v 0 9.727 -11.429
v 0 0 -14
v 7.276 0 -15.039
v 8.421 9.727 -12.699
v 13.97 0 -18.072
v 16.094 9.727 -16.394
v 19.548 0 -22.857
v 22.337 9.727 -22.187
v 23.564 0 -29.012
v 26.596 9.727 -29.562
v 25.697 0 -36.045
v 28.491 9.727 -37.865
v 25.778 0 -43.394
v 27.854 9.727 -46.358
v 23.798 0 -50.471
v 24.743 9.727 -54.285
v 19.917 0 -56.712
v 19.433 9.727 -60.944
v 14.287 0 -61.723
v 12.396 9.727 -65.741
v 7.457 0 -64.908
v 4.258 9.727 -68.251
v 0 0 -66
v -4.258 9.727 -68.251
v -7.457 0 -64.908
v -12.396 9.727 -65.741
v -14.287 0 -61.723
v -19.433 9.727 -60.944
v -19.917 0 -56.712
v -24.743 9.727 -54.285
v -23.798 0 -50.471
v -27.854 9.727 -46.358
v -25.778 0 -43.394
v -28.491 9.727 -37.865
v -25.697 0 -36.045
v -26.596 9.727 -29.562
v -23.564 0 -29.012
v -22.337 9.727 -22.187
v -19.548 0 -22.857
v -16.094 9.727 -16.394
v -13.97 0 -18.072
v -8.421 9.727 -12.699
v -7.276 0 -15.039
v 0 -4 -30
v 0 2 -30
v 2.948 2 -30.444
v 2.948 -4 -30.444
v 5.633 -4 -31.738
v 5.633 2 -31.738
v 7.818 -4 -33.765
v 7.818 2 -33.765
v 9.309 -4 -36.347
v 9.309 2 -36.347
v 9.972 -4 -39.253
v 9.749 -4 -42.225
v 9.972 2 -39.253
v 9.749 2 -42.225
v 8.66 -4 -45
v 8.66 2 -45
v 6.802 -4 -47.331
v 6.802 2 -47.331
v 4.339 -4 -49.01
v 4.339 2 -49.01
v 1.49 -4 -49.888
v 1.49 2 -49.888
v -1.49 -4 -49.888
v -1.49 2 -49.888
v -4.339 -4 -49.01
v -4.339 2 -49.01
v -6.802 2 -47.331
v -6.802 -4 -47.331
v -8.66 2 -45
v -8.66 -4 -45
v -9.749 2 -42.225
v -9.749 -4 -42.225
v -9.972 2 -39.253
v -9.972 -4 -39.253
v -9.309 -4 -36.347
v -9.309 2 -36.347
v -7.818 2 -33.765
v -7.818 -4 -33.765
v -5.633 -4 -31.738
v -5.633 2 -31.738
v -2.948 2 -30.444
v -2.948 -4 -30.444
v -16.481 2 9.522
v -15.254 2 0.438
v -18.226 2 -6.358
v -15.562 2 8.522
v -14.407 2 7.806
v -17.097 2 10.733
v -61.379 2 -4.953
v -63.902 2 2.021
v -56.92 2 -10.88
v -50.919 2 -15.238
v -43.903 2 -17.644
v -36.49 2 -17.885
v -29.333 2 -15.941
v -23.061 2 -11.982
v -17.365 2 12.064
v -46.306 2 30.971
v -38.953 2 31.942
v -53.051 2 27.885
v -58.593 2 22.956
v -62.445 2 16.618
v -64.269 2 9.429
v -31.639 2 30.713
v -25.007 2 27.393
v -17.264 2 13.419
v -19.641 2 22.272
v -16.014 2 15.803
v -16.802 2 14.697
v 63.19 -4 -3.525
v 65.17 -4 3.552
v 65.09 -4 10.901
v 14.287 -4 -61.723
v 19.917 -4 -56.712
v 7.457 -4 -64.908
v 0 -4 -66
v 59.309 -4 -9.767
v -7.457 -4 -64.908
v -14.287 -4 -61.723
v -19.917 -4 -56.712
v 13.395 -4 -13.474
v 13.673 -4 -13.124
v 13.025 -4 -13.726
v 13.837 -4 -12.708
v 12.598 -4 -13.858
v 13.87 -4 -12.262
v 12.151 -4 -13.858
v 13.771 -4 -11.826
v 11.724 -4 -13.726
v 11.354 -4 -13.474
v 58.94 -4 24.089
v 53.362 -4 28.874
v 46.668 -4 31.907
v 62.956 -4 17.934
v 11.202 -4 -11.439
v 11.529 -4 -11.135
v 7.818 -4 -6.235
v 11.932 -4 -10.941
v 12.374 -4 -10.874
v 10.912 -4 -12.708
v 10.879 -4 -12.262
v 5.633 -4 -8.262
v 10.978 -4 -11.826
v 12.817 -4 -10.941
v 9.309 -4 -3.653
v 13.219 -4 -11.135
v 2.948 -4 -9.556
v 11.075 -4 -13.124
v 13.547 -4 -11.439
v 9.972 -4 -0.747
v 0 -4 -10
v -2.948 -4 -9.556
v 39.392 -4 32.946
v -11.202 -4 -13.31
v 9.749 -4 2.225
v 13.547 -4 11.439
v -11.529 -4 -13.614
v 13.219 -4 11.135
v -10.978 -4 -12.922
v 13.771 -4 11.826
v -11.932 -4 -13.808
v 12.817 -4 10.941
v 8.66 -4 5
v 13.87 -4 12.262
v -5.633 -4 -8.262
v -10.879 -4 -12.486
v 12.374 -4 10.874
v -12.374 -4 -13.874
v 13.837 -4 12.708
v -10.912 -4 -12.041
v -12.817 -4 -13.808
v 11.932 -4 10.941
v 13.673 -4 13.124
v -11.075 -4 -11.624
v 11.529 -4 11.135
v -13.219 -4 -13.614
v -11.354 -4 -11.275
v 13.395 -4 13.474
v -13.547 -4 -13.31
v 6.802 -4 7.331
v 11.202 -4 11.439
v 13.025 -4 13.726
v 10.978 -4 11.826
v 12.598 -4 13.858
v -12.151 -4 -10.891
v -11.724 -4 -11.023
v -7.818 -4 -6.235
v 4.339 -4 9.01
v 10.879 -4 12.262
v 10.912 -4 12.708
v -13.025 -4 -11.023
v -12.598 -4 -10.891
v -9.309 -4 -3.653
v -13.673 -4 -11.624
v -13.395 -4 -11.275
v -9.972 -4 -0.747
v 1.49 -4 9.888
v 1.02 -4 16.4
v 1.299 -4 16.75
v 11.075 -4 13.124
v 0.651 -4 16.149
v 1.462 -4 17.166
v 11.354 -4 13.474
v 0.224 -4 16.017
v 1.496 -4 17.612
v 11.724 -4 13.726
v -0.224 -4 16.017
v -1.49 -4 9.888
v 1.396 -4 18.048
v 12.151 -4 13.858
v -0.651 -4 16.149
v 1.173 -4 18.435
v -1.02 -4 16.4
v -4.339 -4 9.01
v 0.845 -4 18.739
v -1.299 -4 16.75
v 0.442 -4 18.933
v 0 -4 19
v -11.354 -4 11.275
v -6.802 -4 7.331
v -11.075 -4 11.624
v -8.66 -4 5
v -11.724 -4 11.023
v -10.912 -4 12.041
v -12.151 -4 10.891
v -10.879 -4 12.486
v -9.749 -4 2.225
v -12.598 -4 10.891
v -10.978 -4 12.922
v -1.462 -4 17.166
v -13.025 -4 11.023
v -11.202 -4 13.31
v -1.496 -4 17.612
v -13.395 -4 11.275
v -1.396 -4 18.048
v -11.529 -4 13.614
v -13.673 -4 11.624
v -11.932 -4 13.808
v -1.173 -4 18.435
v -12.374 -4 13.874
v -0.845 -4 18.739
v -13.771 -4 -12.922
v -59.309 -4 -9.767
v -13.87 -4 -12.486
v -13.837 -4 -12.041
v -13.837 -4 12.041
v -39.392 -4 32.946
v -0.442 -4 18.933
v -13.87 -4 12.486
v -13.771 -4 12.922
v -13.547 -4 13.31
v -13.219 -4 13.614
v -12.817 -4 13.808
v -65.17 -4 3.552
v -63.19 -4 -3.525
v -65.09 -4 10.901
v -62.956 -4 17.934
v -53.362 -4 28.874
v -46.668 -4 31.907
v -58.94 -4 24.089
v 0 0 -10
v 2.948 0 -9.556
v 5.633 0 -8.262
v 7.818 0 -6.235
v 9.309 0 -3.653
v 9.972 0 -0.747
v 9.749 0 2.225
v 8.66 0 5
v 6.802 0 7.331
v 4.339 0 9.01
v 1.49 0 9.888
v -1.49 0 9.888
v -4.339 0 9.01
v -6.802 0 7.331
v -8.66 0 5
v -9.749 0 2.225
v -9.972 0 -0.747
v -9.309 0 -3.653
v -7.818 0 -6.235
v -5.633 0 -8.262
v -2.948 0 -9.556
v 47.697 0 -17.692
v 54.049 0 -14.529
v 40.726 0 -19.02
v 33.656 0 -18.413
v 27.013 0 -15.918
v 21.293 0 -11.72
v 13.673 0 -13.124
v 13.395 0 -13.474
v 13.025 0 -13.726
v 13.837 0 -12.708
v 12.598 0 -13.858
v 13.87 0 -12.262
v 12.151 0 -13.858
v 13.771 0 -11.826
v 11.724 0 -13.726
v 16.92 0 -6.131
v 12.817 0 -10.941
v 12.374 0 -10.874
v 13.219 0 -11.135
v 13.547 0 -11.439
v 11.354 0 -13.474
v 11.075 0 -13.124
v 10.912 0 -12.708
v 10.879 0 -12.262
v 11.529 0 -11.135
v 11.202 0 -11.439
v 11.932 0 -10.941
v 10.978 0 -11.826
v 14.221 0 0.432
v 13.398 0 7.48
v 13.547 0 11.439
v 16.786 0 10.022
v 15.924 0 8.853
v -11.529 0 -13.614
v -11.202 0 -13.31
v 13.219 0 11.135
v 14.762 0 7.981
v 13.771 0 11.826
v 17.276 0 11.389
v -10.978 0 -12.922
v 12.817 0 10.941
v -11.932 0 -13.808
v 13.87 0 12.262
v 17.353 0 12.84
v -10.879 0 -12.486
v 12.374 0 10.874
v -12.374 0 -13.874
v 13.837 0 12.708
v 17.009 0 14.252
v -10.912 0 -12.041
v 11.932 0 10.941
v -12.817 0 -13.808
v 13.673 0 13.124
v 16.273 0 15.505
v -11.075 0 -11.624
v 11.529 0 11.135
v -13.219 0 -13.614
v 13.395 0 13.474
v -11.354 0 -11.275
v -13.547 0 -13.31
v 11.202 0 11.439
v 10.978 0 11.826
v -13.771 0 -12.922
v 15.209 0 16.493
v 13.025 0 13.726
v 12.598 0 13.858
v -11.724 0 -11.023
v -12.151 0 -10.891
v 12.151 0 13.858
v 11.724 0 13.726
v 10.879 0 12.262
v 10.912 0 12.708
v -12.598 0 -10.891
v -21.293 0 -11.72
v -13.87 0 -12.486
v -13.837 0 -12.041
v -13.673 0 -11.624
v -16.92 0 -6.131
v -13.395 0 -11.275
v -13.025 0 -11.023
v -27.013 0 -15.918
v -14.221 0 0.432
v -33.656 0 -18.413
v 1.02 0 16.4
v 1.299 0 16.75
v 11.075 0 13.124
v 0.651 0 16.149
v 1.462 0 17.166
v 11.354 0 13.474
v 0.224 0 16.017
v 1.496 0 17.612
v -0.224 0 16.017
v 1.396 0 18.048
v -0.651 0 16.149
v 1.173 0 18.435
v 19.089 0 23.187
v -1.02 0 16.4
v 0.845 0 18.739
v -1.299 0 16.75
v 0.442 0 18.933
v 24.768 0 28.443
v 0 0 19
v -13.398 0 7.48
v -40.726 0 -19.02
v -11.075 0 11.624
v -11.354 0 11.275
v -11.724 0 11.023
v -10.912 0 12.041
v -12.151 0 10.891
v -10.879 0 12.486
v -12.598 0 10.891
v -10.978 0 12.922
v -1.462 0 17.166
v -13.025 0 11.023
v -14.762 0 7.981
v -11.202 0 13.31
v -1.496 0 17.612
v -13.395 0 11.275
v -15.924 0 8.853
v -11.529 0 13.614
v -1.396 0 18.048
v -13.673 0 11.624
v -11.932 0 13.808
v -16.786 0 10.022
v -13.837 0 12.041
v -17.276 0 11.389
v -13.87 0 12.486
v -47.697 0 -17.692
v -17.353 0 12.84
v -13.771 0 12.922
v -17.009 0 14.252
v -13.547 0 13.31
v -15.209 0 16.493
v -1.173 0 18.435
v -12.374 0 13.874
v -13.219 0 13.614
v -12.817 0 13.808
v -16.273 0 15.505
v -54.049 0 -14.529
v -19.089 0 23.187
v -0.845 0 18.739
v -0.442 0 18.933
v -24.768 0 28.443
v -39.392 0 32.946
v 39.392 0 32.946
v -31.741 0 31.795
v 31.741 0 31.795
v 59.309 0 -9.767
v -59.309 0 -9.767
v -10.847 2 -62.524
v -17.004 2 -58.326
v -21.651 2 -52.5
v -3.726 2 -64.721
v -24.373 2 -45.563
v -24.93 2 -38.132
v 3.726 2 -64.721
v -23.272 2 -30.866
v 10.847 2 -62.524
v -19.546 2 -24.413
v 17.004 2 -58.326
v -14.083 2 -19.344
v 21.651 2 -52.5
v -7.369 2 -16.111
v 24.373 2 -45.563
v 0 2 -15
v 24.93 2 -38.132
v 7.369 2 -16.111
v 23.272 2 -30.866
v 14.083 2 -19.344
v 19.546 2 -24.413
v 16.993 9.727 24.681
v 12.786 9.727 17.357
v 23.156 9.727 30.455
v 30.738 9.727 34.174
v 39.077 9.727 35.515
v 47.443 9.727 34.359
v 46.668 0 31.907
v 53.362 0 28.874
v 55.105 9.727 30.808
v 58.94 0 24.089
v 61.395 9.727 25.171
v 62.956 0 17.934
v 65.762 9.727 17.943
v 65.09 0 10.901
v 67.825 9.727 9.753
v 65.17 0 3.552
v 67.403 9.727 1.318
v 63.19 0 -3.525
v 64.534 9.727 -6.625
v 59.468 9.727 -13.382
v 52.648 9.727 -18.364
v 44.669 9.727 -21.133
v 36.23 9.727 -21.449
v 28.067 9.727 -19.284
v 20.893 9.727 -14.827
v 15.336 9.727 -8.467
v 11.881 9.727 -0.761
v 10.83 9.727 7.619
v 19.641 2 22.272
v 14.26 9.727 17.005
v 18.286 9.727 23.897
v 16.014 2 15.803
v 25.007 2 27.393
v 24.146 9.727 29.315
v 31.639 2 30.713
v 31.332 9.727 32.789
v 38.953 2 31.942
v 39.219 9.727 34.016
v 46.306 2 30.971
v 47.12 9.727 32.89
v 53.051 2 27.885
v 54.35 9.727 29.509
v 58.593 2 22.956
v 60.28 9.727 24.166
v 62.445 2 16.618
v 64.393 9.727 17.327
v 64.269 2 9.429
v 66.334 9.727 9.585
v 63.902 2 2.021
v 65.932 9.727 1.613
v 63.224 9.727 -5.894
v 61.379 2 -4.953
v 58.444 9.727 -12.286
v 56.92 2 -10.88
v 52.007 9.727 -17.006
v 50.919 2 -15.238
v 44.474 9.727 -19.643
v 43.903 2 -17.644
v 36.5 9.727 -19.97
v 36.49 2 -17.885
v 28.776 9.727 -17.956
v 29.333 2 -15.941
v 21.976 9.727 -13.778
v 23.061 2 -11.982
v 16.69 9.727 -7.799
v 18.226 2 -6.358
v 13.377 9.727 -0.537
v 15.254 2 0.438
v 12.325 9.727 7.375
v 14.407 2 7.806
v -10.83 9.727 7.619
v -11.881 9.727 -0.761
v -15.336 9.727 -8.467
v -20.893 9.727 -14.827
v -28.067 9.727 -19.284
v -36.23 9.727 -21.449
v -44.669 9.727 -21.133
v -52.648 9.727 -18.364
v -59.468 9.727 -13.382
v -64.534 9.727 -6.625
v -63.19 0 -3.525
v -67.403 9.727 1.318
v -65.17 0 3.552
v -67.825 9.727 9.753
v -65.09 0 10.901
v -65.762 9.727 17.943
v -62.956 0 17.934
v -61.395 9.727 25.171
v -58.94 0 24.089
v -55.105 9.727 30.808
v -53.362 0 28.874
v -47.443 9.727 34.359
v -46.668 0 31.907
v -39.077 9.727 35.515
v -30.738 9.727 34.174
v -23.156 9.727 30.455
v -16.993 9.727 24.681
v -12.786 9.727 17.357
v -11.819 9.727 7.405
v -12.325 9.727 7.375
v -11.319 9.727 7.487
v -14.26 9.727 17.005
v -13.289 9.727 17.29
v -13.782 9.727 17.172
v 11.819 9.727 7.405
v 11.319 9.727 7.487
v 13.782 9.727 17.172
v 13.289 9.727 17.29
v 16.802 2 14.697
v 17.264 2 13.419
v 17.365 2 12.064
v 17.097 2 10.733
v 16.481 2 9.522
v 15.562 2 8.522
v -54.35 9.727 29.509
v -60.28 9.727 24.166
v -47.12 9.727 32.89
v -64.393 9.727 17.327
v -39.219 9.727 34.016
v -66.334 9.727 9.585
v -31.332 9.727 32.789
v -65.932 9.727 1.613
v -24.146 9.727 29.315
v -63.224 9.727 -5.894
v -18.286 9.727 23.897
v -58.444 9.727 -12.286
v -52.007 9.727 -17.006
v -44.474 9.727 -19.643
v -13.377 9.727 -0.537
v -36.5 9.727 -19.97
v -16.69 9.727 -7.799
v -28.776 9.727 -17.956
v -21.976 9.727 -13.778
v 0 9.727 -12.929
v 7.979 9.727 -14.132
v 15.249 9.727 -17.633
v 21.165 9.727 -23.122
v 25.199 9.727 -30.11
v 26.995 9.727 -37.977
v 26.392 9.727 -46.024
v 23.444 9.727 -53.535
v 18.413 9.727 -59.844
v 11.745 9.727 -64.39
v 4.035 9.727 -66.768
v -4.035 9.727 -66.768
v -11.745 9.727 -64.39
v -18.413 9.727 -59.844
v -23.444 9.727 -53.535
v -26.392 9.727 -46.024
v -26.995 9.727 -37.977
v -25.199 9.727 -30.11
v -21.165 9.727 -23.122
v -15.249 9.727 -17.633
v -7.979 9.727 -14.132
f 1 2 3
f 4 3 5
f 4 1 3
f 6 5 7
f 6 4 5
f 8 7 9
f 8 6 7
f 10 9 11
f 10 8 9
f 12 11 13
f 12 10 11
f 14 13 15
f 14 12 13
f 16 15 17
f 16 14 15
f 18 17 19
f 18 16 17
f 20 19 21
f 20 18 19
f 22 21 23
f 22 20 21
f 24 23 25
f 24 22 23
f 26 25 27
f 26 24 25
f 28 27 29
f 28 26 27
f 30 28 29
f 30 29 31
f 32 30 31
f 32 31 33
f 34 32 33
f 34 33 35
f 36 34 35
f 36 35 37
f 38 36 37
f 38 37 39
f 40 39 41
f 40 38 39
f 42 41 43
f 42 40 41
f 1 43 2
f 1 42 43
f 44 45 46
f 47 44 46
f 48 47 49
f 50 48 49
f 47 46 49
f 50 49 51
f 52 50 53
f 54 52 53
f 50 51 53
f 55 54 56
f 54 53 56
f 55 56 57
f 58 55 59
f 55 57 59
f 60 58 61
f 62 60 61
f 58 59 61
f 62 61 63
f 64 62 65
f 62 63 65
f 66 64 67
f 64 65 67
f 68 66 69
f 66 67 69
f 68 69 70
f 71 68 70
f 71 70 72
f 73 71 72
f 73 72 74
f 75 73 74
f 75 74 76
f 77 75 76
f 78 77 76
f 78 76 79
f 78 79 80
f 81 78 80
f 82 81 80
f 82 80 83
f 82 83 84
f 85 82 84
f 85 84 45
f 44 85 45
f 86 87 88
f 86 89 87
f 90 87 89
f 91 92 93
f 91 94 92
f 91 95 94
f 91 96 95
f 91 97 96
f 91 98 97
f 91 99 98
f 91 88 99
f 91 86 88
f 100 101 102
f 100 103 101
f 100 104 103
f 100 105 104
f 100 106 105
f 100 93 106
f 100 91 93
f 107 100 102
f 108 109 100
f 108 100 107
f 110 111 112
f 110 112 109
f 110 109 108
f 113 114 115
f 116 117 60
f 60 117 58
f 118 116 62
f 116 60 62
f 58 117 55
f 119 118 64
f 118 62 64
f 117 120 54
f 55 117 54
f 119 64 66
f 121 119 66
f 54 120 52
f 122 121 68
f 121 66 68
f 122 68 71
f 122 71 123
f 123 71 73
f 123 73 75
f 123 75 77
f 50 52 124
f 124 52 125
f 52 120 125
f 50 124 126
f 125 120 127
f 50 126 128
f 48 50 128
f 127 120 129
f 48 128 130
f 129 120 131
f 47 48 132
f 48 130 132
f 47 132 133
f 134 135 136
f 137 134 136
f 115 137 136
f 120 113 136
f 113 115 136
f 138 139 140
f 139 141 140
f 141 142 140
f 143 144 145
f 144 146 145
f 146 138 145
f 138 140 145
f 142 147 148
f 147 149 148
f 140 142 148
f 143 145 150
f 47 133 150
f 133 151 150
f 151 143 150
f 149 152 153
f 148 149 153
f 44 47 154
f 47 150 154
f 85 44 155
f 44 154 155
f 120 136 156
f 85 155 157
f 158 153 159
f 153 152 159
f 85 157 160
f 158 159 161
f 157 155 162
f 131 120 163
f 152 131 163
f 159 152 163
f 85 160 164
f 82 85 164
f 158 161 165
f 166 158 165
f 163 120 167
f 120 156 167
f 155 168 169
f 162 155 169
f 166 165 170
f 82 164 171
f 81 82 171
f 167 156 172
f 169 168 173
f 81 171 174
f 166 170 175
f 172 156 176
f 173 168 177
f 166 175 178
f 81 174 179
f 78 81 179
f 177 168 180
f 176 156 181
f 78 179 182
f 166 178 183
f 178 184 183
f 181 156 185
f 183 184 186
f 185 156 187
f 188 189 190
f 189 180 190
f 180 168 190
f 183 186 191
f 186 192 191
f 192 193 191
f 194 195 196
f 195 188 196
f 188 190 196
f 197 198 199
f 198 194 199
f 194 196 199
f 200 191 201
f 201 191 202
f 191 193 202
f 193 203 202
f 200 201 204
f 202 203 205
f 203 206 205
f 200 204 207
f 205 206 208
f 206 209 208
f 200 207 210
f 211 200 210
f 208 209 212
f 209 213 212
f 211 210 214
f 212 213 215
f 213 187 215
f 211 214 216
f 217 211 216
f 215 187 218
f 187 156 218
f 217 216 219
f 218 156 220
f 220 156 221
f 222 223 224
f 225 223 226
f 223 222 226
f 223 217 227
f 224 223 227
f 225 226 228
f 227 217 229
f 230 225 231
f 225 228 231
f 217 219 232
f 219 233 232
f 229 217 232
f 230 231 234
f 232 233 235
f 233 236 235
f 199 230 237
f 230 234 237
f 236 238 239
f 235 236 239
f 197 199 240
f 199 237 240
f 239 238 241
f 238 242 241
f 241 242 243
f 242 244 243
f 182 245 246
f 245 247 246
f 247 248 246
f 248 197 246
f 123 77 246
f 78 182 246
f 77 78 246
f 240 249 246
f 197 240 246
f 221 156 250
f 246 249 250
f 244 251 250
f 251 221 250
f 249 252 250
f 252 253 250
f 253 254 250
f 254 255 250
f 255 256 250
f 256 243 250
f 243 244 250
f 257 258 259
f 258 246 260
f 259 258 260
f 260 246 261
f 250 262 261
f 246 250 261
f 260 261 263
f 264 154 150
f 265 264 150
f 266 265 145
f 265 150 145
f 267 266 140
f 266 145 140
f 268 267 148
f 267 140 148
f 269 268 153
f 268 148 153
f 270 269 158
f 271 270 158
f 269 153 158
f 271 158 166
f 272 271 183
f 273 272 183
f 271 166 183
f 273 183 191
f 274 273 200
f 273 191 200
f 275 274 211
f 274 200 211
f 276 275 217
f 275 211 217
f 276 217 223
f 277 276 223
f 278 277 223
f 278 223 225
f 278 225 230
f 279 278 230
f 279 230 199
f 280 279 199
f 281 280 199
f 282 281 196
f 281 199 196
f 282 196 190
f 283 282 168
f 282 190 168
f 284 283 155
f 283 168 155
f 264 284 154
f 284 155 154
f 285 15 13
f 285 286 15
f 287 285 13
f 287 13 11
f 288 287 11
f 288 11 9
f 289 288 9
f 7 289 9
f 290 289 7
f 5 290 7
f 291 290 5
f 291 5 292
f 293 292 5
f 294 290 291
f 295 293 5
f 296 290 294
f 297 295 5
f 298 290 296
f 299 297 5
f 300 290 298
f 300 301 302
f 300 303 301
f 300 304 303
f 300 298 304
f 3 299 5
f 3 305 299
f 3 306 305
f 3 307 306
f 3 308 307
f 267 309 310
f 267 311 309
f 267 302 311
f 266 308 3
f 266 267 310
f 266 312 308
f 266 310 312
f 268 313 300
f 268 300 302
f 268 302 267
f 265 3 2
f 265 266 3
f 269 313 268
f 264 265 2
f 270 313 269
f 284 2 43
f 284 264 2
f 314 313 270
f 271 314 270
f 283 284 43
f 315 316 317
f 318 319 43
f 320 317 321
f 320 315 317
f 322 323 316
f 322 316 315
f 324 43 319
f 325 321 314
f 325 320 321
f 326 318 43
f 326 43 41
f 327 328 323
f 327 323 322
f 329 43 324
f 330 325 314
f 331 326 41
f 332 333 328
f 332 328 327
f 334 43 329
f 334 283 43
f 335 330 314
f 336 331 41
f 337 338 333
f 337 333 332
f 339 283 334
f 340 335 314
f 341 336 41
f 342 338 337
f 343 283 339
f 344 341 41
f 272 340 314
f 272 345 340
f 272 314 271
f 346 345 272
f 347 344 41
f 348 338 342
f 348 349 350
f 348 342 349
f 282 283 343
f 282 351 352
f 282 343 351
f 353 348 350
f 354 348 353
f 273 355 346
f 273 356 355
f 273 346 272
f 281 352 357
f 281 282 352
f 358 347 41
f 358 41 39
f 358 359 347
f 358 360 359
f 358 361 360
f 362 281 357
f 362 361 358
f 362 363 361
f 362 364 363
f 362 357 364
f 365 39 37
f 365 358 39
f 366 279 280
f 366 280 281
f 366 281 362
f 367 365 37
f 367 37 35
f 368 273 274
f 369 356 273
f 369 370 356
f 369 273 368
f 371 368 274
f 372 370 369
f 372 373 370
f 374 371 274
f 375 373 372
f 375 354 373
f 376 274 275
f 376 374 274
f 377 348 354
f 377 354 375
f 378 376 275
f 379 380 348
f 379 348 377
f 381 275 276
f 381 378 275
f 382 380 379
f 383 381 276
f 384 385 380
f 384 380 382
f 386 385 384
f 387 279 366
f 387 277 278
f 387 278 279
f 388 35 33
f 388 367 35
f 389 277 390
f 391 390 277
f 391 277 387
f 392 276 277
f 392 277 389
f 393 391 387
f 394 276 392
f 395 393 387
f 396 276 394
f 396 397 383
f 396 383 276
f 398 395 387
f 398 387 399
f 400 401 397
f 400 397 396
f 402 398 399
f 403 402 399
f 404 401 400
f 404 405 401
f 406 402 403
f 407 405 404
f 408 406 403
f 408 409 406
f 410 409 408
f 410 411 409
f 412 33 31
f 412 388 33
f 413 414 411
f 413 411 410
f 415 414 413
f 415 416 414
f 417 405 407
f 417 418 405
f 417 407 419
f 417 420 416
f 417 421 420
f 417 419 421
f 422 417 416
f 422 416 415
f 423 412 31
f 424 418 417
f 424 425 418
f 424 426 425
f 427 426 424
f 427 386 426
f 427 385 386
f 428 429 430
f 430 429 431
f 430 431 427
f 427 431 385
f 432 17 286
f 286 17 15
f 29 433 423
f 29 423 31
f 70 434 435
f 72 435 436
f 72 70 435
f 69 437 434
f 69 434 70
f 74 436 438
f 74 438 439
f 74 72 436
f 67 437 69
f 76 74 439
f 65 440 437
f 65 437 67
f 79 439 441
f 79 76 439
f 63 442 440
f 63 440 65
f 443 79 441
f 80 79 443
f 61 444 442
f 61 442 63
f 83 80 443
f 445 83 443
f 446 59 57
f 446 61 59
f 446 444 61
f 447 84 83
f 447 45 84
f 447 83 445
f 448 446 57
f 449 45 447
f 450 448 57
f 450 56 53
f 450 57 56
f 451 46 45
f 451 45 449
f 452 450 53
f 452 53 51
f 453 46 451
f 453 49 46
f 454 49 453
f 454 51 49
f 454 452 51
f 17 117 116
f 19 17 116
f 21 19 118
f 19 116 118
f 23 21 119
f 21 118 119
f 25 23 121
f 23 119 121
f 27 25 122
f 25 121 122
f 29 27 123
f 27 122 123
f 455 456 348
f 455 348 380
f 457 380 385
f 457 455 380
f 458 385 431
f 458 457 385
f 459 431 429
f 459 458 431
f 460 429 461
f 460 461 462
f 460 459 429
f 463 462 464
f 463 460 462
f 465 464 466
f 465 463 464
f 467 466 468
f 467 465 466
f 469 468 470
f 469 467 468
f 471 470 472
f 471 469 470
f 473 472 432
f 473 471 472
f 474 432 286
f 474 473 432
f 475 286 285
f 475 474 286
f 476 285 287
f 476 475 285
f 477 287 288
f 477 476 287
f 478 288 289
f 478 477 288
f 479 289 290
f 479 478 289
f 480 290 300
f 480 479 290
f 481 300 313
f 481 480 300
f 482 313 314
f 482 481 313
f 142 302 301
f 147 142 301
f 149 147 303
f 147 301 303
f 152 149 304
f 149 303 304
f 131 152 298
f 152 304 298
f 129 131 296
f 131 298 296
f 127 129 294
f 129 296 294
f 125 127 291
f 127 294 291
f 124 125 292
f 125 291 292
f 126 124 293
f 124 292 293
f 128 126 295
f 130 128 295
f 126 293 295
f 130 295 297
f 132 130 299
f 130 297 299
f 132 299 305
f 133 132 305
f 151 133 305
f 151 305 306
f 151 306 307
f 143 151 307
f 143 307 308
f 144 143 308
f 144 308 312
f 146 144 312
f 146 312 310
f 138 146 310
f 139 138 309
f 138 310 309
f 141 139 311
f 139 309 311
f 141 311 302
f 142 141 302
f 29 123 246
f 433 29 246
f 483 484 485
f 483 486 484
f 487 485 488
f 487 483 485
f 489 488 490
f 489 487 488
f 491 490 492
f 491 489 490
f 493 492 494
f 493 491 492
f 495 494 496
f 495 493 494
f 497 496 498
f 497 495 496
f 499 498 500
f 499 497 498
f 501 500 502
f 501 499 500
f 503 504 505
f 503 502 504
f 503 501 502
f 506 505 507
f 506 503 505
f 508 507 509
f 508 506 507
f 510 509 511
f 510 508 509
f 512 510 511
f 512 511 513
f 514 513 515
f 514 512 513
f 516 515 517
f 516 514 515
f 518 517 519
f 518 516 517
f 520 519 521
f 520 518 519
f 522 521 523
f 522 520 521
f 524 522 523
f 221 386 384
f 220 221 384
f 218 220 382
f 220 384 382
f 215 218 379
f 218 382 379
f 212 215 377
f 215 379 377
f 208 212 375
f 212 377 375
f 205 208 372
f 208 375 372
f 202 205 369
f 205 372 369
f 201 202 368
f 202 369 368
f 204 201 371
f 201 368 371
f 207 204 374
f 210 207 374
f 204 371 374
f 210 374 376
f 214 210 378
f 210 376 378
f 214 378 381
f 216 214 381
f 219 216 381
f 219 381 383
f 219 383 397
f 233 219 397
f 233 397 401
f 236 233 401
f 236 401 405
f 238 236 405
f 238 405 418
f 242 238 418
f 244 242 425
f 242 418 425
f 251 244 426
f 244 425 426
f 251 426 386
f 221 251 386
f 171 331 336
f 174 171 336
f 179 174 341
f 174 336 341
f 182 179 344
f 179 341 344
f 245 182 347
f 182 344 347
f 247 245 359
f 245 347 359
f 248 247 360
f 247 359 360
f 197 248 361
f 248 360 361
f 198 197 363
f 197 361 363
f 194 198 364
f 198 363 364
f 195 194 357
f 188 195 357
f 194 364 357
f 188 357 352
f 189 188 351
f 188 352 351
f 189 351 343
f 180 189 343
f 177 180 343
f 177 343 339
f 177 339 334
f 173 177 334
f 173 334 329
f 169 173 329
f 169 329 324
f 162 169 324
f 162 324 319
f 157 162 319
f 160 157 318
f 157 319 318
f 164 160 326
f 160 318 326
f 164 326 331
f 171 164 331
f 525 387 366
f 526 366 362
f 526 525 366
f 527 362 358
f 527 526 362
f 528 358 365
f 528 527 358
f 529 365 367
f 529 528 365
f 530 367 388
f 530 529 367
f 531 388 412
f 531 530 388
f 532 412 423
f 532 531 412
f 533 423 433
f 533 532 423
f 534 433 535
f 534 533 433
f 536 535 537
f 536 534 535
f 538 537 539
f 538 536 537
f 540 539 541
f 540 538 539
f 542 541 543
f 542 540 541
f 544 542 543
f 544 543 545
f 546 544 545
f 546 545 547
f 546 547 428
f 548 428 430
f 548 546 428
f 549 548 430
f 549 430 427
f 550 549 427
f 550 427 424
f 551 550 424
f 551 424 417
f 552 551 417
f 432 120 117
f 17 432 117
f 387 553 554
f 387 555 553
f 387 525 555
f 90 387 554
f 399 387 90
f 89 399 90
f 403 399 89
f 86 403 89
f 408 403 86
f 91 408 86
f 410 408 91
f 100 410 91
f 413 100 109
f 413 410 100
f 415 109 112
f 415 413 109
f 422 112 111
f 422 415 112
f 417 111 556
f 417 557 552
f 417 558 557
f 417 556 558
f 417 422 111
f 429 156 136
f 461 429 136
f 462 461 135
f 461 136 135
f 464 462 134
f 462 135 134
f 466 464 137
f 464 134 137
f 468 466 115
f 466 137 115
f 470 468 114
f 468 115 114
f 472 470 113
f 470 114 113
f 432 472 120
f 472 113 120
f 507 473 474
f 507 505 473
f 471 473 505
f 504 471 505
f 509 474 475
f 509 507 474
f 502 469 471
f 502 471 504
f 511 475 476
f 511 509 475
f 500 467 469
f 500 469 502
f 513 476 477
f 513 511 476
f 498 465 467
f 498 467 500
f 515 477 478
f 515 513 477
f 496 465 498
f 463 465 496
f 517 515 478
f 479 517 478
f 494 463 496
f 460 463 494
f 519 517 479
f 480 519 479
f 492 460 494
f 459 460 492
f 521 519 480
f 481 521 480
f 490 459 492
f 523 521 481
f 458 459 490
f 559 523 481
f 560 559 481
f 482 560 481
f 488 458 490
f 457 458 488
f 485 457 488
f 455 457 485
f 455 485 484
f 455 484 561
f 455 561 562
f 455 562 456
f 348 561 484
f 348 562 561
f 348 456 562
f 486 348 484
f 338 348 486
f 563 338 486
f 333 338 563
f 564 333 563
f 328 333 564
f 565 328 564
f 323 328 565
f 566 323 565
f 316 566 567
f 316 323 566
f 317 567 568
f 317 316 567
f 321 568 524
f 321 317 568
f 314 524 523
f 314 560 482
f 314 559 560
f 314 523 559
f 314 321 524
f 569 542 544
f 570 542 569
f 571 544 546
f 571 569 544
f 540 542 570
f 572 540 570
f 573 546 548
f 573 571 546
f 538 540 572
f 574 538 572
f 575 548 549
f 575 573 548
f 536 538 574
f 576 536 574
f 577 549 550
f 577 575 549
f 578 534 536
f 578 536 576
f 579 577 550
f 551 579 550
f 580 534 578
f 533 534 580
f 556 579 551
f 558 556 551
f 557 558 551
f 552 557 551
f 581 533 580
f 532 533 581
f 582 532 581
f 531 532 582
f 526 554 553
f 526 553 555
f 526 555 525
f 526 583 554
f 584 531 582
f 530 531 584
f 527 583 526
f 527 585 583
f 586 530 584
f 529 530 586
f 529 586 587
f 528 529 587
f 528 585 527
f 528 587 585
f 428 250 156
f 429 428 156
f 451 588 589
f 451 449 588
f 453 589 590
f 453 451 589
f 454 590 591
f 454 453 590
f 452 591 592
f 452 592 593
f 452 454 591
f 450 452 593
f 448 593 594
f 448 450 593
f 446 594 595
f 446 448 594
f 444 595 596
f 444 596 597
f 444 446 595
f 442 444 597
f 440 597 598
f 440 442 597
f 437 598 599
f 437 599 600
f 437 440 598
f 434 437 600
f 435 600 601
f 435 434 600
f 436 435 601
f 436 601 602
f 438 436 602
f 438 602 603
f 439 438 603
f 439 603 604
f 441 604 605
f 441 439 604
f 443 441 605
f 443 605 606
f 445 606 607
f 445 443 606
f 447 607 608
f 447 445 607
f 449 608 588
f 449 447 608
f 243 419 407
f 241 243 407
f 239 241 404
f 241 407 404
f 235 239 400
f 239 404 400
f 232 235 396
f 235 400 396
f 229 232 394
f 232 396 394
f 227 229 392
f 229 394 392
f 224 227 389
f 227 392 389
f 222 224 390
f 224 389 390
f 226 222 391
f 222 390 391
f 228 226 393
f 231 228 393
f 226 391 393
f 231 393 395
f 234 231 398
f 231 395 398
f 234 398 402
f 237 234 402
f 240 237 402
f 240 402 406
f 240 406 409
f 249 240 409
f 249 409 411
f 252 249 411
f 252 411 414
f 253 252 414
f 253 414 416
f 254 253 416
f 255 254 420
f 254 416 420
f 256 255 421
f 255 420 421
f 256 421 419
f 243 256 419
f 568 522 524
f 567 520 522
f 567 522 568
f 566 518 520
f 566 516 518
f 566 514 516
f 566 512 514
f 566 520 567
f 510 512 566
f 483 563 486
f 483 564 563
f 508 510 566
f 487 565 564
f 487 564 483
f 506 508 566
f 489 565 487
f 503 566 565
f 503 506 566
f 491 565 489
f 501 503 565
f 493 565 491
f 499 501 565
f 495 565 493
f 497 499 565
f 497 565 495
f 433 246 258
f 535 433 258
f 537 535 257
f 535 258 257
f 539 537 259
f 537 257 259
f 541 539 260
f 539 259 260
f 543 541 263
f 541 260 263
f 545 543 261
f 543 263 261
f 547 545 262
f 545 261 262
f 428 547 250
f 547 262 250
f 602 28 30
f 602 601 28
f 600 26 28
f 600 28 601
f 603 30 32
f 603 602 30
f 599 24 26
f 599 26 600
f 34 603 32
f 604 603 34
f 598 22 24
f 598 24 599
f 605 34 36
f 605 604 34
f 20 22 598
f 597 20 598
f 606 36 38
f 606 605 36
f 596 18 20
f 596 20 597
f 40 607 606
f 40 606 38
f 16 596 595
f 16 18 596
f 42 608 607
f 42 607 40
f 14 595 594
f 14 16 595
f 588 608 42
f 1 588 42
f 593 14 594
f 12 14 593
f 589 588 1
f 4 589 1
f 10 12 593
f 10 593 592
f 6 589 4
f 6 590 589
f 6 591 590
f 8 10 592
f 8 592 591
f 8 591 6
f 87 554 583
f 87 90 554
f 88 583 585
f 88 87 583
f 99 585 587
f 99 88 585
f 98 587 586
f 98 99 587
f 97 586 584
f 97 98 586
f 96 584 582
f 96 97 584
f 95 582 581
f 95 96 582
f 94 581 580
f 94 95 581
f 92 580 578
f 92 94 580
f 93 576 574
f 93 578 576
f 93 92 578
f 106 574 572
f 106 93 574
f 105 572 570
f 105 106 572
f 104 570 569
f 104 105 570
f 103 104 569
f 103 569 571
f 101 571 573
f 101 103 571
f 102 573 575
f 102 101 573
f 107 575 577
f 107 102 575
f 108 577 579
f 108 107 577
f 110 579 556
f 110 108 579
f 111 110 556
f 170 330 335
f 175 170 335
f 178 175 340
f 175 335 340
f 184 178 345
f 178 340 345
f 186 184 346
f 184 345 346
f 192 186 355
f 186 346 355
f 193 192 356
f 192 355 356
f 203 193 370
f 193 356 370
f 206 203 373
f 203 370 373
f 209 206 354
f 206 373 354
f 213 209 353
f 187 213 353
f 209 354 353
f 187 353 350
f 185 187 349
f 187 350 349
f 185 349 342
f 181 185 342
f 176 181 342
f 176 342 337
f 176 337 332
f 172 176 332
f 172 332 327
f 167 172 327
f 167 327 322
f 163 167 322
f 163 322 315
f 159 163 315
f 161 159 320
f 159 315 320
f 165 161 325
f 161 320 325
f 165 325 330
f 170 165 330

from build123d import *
from build123d.topology import SkipClean

# Parameters (mm, degrees)
SKETCH_1_R               = 26
EXTRUDE_1_DEPTH          = 2
EXTRUDE_1_2_DEPTH        = 2
EXTRUDE_1_3_DEPTH        = 2
EXTRUDE_START            = 4
SKETCH_2_R               = 10
EXTRUDE_2_DEPTH          = 4
SKETCH_3_R               = 1.5
CUT_EXTRUDE_1_DEPTH      = 4
PATTERN_CIRCULAR_2_COUNT = 2
PATTERN_CIRCULAR_2_ANGLE = 100
F_2_THE_OTHER_WAY_COUNT  = 2
F_2_THE_OTHER_WAY_ANGLE  = 100
SKETCH_5_R               = 5
CUT_EXTRUDE_2_DEPTH      = 10
SKETCH_7_R               = 10
CUT_EXTRUDE_3_DEPTH      = 10


with BuildPart() as part:
    # 草图1 → 凸台-拉伸1 (new body)
    with BuildSketch(Plane(origin=(0, 0, 0), x_dir=(1, 0, 0), z_dir=(0, 1, 0))):
        with Locations((0, 40)):
            Circle(SKETCH_1_R)
    extrude(amount=EXTRUDE_1_DEPTH)



with BuildPart() as body_2:
    # 草图1 → Extrude 1 2 (new body)
    with BuildSketch(Plane(origin=(0, 0, 0), x_dir=(1, 0, 0), z_dir=(0, 1, 0))):
        with Locations((39.39231012, -6.945927107)):
            Circle(SKETCH_1_R)
    extrude(amount=EXTRUDE_1_2_DEPTH)


with BuildPart() as body_3:
    # 草图1 → Extrude 1 3 (new body)
    with BuildSketch(Plane(origin=(0, 0, 0), x_dir=(1, 0, 0), z_dir=(0, 1, 0))):
        with Locations((-39.39231012, -6.945927107)):
            Circle(SKETCH_1_R)
    extrude(amount=EXTRUDE_1_3_DEPTH)


with BuildPart() as part_1:
    with SkipClean():  # the faces are left unmerged after this step: merging them gives an invalid solid
        add(part.part)

        add(body_2.part)  # 凸台-拉伸2 merges body 2

        add(body_3.part)  # 凸台-拉伸2 merges body 3
        # 草图2 → 凸台-拉伸2 (add)
        with BuildSketch(Plane.XZ.offset(EXTRUDE_START)):
            with BuildLine():
                Line((39.39231012, 32.945927107), (-39.39231012, 32.945927107))
                ThreePointArc((-39.39231012, 32.945927107), (-62.956312583, 17.934001912), (-59.309465642, -9.766550745))
                Line((-59.309465642, -9.766550745), (-19.917155521, -56.712477852))
                ThreePointArc((-19.917155521, -56.712477852), (0, -66), (19.917155521, -56.712477852))
                Line((19.917155521, -56.712477852), (59.309465642, -9.766550745))
                ThreePointArc((59.309465642, -9.766550745), (62.956312583, 17.934001912), (39.39231012, 32.945927107))
            make_face()
            Circle(SKETCH_2_R, mode=Mode.SUBTRACT)
        extrude(amount=-EXTRUDE_2_DEPTH)

    # 草图3 → 切除-拉伸1 (cut)
    with SkipClean():  # the faces are left unmerged after this step: merging them gives an invalid solid
        with BuildSketch(Plane(origin=(0, 0, 0), x_dir=(1, 0, 0), z_dir=(0, 1, 0))):
            with Locations((12.374368671, 12.374368671)):
                Circle(SKETCH_3_R)
            with Locations((-12.374368671, 12.374368671)):
                Circle(SKETCH_3_R)
            with Locations((-12.374368671, -12.374368671)):
                Circle(SKETCH_3_R)
            with Locations((12.374368671, -12.374368671)):
                Circle(SKETCH_3_R)
            with Locations((0, -17.5)):
                Circle(SKETCH_3_R)
        extrude(amount=-CUT_EXTRUDE_1_DEPTH, mode=Mode.SUBTRACT)

    # 草图4 → 旋转1 (revolve)
    with BuildSketch(Plane(origin=(0, 0, 0), x_dir=(0, 0, -1), z_dir=(1, 0, 0))):
        Polygon((68.570552361, 9.72740661), (67.070552361, 9.72740661), (65, 2), (66, 2), (66, 0), align=None)
    revolve_1 = revolve(axis=Axis((0, 2, -40), (0, 1, 0)))

    # 阵列(圆周)2: 旋转1 ×2 about axis
    with SkipClean():  # the faces are left unmerged after this step: merging them gives an invalid solid
        pattern_circular_2_axis = Axis((0, -6.257104181, 0), (0, 1, 0))
        for i in range(1, PATTERN_CIRCULAR_2_COUNT):
            add(revolve_1.rotate(pattern_circular_2_axis, i * PATTERN_CIRCULAR_2_ANGLE / (PATTERN_CIRCULAR_2_COUNT - 1)))

    # 2 the other way: 旋转1 ×2 about axis
    f_2_the_other_way_axis = Axis((0, -6.257104181, 0), (0, -1, 0))
    for i in range(1, F_2_THE_OTHER_WAY_COUNT):
        add(revolve_1.rotate(f_2_the_other_way_axis, i * F_2_THE_OTHER_WAY_ANGLE / (F_2_THE_OTHER_WAY_COUNT - 1)))

    # 草图5 → 切除-拉伸2 (cut)
    with BuildSketch(Plane(origin=(0, 0, 0), x_dir=(1, 0, 0), z_dir=(0, 1, 0))):
        with Locations((12.374368671, -12.374368671)):
            Circle(SKETCH_5_R)
        with Locations((-12.374368671, -12.374368671)):
            Circle(SKETCH_5_R)
    extrude(amount=CUT_EXTRUDE_2_DEPTH, mode=Mode.SUBTRACT)

    # 草图7 → 切除-拉伸3 (cut)
    with BuildSketch(Plane(origin=(0, 2, 0), x_dir=(1, 0, 0), z_dir=(0, 1, 0))):
        with Locations((0, 40)):
            Circle(SKETCH_7_R)
    extrude(amount=-CUT_EXTRUDE_3_DEPTH, mode=Mode.SUBTRACT)


solid = part_1.part
